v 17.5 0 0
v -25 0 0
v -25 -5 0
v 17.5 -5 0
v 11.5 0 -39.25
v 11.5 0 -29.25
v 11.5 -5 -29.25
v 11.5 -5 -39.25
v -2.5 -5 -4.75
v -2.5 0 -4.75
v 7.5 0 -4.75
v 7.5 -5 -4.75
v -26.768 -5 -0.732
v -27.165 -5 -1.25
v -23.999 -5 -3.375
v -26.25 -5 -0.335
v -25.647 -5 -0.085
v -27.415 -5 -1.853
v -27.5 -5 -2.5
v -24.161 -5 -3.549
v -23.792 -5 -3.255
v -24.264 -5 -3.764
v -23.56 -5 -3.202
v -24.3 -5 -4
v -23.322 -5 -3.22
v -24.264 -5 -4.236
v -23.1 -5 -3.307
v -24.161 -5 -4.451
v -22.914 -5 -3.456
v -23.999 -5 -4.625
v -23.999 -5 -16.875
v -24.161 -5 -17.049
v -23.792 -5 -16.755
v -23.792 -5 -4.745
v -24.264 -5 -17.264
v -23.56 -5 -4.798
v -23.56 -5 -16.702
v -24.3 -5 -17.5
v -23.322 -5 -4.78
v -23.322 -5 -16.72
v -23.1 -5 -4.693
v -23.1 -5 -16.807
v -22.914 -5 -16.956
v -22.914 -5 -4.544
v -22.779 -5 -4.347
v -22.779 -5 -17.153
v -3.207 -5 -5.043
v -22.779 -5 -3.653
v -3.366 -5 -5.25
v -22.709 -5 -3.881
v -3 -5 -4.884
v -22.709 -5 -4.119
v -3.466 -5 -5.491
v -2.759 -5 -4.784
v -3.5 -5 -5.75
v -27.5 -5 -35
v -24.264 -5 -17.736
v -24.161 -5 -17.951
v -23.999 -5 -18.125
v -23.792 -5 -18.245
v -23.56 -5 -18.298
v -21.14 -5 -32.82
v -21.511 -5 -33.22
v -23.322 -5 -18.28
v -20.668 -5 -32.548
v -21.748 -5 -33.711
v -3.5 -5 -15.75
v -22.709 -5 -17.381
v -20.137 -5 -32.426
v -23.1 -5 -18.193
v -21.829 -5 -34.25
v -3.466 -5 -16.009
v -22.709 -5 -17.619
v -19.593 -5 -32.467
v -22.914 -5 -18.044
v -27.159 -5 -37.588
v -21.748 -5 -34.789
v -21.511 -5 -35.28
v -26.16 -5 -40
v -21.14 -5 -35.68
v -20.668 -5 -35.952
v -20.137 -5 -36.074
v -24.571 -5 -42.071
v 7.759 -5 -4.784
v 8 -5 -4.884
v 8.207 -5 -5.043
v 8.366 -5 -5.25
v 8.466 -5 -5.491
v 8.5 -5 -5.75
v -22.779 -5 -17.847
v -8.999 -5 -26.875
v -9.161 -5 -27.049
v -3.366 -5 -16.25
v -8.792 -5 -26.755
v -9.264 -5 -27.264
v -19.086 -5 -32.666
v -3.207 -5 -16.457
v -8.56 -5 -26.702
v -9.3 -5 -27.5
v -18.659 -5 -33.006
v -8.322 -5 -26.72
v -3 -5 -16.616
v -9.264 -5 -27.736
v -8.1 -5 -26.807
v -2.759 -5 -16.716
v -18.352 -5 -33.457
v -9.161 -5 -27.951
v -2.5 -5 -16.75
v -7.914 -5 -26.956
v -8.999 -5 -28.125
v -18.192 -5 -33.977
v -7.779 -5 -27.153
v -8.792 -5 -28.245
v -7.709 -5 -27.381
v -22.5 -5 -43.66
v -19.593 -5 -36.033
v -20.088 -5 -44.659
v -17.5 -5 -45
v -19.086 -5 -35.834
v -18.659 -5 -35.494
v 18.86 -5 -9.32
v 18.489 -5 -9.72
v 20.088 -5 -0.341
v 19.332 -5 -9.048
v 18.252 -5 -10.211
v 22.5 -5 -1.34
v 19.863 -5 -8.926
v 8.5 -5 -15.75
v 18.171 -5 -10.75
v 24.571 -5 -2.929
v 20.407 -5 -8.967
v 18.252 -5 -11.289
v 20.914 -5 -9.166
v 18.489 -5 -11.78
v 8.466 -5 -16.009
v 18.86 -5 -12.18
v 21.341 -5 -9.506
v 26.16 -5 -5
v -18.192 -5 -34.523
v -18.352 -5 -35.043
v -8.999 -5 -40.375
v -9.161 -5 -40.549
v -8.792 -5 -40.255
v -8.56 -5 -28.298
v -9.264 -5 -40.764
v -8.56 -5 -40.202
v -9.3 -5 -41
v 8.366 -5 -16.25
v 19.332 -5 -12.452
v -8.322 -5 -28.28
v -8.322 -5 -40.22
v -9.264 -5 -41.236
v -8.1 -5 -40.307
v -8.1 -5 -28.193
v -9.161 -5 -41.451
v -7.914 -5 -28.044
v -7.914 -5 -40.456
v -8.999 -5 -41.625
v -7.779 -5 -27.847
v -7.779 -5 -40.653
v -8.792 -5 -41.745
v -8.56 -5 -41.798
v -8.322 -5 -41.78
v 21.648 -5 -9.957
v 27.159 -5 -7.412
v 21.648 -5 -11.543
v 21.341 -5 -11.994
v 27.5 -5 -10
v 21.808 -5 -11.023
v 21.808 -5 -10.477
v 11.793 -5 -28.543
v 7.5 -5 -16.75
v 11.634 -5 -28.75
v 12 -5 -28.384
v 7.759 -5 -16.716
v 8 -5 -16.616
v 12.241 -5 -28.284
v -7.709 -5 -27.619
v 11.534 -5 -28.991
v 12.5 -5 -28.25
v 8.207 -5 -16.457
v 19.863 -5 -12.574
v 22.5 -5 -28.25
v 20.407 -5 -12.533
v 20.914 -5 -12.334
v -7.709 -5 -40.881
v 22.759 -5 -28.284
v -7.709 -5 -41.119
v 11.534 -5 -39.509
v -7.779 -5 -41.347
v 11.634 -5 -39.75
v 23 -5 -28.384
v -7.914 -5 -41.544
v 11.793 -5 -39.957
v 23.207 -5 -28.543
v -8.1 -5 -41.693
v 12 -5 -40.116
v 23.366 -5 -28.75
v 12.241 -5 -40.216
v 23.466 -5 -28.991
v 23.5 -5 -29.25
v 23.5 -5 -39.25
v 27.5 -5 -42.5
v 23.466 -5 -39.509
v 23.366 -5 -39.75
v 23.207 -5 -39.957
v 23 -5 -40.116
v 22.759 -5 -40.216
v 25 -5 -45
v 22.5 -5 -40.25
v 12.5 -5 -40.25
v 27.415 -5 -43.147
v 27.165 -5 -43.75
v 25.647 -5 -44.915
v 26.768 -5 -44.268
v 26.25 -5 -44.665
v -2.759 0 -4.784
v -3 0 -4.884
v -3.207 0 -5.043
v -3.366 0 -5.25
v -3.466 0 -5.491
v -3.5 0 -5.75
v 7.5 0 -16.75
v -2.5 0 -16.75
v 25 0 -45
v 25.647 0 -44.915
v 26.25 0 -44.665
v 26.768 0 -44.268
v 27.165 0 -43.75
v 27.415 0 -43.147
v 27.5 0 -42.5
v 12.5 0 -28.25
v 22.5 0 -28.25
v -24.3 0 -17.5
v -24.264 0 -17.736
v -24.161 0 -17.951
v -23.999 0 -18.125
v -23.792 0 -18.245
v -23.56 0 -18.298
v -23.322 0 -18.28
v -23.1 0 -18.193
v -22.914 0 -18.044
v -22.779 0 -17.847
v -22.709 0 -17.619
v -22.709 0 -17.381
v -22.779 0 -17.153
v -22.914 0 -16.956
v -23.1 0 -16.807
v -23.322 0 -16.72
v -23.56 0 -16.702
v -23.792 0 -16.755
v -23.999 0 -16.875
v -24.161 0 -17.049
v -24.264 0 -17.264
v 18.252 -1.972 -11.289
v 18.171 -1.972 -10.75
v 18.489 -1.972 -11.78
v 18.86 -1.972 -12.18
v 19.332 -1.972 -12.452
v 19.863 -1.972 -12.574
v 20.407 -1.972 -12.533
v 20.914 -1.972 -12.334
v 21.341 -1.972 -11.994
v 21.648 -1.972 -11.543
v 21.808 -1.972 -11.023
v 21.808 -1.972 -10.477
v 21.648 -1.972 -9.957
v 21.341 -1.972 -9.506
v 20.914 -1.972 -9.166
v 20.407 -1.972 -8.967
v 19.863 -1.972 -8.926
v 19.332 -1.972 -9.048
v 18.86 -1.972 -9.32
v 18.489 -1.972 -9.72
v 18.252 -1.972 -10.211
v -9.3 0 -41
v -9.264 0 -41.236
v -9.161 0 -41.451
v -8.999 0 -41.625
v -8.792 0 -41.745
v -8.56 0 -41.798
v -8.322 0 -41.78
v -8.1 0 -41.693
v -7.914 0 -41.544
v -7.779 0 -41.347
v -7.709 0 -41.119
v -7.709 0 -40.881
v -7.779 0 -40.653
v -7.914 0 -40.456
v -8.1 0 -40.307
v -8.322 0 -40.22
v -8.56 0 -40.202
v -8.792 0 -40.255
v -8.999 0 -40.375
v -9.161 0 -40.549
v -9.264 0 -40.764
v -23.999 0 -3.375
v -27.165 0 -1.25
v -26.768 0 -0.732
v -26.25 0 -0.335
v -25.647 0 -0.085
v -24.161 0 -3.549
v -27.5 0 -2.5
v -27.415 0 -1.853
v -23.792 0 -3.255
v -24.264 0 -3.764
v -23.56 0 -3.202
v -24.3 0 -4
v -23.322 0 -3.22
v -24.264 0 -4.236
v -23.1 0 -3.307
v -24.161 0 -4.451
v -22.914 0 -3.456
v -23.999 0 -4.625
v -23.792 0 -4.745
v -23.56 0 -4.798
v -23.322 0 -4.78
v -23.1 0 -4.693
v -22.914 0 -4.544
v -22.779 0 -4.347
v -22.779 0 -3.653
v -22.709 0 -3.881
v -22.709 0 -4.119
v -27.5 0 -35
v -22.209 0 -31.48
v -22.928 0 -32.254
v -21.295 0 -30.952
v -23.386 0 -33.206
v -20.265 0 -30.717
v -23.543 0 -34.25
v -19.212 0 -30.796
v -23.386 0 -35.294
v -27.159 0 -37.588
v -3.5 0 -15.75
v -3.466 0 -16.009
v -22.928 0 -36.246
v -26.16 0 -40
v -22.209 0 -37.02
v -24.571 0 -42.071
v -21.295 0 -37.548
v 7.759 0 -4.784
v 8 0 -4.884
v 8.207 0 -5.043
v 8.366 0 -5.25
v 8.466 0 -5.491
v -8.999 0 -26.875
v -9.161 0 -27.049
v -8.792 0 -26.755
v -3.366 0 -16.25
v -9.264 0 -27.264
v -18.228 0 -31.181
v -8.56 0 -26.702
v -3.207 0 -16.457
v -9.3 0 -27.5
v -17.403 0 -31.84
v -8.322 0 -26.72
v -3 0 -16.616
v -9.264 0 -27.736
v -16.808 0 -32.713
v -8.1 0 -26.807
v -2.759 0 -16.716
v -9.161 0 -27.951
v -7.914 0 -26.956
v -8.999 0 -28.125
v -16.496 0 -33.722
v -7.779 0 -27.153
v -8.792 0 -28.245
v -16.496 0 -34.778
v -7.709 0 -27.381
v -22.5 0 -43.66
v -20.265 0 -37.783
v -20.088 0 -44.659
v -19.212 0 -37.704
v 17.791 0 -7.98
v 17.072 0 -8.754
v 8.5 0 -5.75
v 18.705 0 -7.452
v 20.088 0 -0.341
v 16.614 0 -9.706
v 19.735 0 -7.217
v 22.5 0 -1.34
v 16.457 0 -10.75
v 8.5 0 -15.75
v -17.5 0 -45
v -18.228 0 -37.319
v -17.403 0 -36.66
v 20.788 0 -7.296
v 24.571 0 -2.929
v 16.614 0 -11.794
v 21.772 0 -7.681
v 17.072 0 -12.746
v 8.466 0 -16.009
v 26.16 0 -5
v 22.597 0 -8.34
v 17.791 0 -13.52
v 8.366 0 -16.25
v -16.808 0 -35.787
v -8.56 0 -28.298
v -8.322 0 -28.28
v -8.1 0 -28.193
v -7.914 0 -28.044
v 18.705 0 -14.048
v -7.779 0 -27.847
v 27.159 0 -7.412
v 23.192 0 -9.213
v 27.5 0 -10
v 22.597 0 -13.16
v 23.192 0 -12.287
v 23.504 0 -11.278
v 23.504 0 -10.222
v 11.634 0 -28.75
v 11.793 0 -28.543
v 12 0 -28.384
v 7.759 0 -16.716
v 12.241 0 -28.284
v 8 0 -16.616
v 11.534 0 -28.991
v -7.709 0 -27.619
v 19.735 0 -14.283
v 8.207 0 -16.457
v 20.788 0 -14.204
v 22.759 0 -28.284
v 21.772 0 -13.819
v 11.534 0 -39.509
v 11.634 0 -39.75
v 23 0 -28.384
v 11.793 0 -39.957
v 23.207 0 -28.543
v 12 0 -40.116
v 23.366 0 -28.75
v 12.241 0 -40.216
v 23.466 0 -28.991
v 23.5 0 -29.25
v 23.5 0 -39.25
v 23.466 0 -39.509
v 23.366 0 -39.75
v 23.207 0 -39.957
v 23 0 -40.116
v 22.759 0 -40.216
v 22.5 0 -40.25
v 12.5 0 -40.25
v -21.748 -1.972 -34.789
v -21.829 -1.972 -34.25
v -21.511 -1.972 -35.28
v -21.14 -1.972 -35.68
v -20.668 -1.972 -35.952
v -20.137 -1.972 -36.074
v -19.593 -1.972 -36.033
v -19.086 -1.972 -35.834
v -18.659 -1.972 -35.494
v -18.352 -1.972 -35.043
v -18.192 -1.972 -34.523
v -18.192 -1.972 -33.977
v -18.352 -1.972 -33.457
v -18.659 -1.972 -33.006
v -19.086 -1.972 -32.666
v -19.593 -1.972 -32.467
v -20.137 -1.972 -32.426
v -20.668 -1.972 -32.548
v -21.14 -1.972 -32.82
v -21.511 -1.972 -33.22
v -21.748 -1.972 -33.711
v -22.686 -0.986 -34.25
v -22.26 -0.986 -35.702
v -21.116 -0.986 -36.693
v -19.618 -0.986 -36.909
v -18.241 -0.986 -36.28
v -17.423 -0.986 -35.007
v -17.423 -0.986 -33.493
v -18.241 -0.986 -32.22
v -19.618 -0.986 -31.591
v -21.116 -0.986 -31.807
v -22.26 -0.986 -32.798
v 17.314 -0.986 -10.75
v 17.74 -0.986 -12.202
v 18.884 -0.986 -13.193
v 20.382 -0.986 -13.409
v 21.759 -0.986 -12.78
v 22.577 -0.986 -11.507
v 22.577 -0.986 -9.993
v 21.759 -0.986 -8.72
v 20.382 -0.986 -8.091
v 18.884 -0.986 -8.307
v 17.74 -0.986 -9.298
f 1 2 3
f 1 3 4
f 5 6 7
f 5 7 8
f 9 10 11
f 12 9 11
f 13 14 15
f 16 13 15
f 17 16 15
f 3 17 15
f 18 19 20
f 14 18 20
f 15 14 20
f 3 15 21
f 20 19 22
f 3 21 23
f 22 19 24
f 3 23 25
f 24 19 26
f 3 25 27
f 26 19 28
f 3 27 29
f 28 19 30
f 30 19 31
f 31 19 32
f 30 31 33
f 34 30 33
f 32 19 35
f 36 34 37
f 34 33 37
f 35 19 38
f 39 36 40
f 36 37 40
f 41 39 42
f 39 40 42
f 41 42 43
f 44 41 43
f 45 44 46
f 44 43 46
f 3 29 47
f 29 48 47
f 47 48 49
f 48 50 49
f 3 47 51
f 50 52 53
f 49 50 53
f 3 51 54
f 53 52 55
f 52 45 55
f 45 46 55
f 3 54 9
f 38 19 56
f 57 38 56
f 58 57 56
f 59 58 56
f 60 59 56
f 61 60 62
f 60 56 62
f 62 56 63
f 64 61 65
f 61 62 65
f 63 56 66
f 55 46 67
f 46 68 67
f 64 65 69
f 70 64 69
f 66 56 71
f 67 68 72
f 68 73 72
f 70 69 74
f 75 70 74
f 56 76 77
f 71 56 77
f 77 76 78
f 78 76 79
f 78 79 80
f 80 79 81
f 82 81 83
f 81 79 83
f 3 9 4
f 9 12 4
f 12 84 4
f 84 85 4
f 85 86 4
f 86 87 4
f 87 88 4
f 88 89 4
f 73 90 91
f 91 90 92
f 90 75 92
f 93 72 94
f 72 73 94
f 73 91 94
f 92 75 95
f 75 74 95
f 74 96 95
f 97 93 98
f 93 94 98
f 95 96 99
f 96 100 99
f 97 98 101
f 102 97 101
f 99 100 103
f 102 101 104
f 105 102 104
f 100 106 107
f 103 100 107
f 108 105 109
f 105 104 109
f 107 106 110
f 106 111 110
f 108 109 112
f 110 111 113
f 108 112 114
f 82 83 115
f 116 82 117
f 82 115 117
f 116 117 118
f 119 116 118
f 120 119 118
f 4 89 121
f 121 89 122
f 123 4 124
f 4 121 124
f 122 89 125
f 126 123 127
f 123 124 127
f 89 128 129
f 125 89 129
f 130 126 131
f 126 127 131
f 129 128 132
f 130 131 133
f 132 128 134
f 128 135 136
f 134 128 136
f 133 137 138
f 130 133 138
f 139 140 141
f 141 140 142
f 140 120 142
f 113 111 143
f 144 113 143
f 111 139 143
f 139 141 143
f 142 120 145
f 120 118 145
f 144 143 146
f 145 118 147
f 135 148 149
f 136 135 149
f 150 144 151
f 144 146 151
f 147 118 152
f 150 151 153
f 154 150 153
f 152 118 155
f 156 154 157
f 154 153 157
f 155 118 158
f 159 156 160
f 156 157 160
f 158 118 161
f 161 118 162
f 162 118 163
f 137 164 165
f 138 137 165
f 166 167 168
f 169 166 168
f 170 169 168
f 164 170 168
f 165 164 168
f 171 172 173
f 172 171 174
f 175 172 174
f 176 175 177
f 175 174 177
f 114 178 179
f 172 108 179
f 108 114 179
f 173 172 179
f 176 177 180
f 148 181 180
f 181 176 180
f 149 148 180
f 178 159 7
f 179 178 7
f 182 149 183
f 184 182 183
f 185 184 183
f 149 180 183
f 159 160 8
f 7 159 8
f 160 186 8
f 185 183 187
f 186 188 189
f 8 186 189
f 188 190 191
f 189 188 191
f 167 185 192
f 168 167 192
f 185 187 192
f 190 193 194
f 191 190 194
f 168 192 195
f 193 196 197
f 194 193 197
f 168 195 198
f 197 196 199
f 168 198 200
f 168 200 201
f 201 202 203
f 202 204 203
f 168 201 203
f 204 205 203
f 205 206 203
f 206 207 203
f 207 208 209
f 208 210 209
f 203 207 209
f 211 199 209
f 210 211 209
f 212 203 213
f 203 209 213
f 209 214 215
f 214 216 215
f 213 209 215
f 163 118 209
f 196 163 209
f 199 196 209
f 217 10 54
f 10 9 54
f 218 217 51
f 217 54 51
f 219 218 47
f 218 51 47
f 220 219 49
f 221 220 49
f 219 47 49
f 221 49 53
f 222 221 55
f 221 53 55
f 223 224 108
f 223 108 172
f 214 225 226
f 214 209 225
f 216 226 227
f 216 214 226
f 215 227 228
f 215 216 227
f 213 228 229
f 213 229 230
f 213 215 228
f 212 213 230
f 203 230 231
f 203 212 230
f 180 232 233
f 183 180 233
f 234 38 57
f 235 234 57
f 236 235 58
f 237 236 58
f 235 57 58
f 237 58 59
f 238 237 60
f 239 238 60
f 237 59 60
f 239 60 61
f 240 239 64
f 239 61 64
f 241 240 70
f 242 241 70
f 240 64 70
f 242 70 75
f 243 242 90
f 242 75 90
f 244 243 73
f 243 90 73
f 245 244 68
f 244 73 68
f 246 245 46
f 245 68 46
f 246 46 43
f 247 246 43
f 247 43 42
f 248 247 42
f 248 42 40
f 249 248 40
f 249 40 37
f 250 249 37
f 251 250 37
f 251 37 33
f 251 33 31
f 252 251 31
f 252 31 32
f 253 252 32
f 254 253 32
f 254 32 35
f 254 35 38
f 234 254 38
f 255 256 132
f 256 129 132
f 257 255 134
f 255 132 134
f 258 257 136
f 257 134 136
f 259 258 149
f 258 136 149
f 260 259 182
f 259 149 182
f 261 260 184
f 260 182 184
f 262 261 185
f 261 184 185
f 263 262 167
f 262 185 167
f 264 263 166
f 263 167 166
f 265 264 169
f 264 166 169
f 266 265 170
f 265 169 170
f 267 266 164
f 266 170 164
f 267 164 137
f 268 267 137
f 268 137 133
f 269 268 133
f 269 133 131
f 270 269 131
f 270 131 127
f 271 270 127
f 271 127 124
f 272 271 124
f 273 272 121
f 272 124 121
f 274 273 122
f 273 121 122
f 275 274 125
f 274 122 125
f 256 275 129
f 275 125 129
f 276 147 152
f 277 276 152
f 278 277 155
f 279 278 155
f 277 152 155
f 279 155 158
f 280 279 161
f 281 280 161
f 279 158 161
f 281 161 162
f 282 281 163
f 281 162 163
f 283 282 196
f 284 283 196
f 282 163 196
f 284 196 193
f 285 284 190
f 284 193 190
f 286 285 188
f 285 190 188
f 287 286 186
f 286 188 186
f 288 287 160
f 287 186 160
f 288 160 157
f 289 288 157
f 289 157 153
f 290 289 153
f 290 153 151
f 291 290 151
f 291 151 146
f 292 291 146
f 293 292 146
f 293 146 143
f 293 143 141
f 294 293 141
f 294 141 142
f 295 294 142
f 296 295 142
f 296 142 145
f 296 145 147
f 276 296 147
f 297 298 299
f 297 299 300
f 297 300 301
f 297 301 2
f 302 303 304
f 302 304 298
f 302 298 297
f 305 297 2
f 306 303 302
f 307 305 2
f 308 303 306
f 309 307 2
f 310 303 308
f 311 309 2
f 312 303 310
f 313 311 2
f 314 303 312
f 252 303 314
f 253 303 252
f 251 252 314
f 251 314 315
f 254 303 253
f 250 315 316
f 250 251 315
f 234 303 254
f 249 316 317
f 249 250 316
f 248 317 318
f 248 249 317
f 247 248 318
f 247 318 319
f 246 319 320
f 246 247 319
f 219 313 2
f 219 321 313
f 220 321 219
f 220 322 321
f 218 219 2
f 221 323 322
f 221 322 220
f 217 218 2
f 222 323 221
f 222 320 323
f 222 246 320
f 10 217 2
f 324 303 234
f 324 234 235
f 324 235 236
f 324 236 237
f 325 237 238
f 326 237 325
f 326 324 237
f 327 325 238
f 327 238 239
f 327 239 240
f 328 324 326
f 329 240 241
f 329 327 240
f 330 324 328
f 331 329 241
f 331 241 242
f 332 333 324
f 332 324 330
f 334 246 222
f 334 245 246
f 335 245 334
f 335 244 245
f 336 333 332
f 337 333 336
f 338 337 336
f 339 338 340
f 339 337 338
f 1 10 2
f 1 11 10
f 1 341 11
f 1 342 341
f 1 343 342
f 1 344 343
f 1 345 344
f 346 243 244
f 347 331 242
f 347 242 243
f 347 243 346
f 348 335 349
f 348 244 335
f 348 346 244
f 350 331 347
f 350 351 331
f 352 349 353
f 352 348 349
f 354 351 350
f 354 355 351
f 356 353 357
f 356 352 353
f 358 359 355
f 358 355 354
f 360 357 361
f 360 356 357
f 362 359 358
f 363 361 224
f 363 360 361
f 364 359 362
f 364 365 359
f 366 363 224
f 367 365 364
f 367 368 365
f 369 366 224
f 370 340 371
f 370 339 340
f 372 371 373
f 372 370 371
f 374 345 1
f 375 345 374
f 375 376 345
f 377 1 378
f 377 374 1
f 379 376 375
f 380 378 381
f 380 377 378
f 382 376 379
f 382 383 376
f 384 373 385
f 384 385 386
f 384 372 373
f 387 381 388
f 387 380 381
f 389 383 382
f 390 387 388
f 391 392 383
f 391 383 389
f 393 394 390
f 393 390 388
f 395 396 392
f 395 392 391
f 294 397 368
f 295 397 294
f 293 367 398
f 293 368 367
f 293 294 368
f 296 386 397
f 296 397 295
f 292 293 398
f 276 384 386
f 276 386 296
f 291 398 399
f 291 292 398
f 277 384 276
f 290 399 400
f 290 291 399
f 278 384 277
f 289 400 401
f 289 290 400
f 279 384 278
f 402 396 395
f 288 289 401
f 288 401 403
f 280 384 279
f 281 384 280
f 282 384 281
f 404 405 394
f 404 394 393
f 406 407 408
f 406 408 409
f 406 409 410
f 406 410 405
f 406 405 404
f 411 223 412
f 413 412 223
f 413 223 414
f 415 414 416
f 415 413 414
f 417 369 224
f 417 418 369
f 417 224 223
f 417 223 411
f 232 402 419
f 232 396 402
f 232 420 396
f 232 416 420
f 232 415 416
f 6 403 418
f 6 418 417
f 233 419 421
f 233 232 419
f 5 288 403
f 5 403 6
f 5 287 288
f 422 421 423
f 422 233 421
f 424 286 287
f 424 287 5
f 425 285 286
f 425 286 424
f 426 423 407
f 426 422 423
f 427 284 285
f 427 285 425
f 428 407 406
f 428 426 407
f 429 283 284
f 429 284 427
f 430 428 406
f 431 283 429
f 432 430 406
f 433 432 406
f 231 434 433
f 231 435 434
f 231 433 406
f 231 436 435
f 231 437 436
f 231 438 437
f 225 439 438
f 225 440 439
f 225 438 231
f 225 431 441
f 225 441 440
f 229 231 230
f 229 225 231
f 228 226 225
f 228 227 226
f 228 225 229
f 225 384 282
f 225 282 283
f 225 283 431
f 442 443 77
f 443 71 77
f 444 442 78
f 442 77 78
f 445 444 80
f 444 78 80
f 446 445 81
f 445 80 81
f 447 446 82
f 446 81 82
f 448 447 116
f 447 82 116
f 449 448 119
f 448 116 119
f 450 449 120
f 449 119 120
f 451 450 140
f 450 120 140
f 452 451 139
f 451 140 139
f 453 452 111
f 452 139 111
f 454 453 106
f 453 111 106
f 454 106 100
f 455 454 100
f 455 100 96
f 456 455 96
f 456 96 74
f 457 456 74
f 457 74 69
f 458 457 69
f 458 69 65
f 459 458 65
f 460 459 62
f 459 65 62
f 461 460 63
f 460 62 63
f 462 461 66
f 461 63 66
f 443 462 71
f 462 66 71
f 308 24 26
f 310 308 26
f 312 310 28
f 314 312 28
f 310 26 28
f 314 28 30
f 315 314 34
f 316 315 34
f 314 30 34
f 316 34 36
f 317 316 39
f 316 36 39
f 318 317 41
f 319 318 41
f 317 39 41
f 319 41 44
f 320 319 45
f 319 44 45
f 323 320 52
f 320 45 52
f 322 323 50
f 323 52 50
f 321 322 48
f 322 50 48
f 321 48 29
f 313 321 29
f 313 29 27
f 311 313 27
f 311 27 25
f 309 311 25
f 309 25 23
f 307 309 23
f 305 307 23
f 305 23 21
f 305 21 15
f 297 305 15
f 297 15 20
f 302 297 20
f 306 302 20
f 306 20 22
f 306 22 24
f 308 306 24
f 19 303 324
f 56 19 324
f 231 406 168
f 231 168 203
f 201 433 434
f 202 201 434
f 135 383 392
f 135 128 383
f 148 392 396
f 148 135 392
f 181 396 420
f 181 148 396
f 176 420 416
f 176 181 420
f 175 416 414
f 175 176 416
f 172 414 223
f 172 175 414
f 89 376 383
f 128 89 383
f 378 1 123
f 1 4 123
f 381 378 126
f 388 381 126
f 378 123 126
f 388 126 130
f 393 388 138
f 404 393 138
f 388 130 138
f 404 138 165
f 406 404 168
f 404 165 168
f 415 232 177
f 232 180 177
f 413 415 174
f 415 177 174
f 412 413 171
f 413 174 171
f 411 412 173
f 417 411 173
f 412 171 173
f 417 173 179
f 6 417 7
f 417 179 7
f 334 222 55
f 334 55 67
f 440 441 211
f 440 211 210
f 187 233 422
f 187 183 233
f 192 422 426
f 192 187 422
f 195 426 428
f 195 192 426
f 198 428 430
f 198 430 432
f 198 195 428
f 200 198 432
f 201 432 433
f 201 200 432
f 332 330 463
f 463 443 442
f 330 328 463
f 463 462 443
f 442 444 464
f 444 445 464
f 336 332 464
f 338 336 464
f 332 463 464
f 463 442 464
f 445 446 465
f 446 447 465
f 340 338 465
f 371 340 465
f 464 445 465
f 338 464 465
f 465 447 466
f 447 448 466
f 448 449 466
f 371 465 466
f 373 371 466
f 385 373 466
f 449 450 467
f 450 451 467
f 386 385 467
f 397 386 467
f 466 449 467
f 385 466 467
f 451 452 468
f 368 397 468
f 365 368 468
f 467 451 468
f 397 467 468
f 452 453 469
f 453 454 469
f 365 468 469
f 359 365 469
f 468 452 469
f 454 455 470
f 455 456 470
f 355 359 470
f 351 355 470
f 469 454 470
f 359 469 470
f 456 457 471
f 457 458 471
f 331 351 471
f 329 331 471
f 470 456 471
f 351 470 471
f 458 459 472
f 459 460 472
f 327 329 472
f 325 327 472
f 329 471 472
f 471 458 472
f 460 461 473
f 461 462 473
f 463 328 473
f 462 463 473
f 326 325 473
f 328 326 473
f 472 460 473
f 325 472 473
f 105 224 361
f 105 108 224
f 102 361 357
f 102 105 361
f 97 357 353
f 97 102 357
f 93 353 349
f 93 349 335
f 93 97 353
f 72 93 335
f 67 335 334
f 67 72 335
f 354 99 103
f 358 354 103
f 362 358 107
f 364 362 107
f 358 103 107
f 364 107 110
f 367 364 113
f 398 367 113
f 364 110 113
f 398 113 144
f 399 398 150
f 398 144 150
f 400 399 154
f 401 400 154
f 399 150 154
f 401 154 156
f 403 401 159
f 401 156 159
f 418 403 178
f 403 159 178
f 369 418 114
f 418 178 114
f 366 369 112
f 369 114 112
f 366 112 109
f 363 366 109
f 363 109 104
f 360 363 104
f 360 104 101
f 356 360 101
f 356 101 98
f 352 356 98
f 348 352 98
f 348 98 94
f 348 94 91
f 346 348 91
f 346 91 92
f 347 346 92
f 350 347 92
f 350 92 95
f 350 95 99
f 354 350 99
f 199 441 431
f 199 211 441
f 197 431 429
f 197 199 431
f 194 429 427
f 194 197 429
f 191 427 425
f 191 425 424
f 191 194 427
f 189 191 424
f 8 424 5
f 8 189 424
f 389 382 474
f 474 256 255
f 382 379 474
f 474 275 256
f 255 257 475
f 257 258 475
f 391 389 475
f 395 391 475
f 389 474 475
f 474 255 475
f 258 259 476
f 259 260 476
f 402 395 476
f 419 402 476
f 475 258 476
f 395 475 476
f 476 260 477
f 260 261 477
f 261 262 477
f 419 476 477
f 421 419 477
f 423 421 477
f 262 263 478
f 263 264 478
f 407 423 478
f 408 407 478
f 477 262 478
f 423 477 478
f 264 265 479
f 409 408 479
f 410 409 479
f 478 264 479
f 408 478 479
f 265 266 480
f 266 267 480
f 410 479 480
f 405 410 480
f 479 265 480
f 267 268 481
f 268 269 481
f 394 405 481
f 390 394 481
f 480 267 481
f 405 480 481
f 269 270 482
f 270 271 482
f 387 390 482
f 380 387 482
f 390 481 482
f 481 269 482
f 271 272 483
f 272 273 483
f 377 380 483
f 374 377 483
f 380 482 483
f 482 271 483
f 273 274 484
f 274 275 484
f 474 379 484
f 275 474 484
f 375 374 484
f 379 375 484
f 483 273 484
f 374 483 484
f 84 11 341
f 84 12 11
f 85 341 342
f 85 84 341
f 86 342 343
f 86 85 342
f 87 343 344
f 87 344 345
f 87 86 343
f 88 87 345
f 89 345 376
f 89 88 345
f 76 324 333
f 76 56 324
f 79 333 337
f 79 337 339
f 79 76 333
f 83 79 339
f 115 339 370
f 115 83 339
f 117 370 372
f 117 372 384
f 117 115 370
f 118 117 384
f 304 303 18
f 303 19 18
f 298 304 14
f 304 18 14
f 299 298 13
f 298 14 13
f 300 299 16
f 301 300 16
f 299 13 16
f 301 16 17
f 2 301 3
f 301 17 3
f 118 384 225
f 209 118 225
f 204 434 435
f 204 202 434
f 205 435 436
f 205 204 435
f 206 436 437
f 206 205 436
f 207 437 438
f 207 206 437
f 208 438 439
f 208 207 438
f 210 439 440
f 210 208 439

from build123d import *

# Parameters (mm, degrees)
BASE_SKETCH_W               = 55
BASE_SKETCH_H               = 45
BASE_EXTRUDE_DEPTH          = 5
MOSFET_MOUNTING_HOLES_D     = 1.6
MOUNTING_HOLES_D            = 3.6576
MOUNTING_HOLES_CSINK_D      = 7.0866
MOUNTING_HOLES_CSINK_ANGLE  = 82
PIN_RELIEF_SKETCH_W         = 12
PIN_RELIEF_SKETCH_H         = 12
CUT_TERMAL_PIN_RELIEF_DEPTH = 53.974050251
FILLET1_R                   = 10
FILLET2_R                   = 2.5
FILLET3_R                   = 1


with BuildPart() as part:
    # Base Sketch → Base Extrude (new body)
    with BuildSketch(Plane(origin=(0, 0, 0), x_dir=(1, 0, 0), z_dir=(0, 1, 0))):
        with Locations((0, 22.5)):
            Rectangle(BASE_SKETCH_W, BASE_SKETCH_H)
    extrude(amount=-BASE_EXTRUDE_DEPTH)

    # Mosfet Mounting Holes (through all)
    with Locations(Plane(origin=(0, 0, 0), x_dir=(1, 0, 0), z_dir=(0, 1, 0))):
        with Locations((-23.5, 4), (-23.5, 17.5), (-8.5, 27.5), (-8.5, 41)):
            Hole(MOSFET_MOUNTING_HOLES_D / 2)

    # Mounting Holes (through all)
    with Locations(Plane(origin=(0, 0, 0), x_dir=(1, 0, 0), z_dir=(0, 1, 0))):
        with Locations((-20, 34.25), (20, 10.75)):
            CounterSinkHole(MOUNTING_HOLES_D / 2, MOUNTING_HOLES_CSINK_D / 2, counter_sink_angle=MOUNTING_HOLES_CSINK_ANGLE)

    # Pin Relief Sketch → Cut Termal Pin Relief (cut, through all)
    with BuildSketch(Plane(origin=(0, 0, 0), x_dir=(1, 0, 0), z_dir=(0, 1, 0))):
        with Locations((2.5, 10.75)):
            Rectangle(PIN_RELIEF_SKETCH_W, PIN_RELIEF_SKETCH_H)
        with Locations((17.5, 34.25)):
            Rectangle(PIN_RELIEF_SKETCH_W, PIN_RELIEF_SKETCH_H)
    extrude(amount=-CUT_TERMAL_PIN_RELIEF_DEPTH, mode=Mode.SUBTRACT)

    # Fillet1
    fillet1_edges = [part.edges().sort_by_distance(p)[0] for p in [
        (-27.5, -2.5, -45),
        (27.5, -2.5, 0),
    ]]
    fillet(fillet1_edges, radius=FILLET1_R)

    # Fillet2
    fillet2_edges = [part.edges().sort_by_distance(p)[0] for p in [
        (27.5, -2.5, -45),
        (-27.5, -2.5, 0),
    ]]
    fillet(fillet2_edges, radius=FILLET2_R)

    # Fillet3
    fillet3_edges = [part.edges().sort_by_distance(p)[0] for p in [
        (-3.5, -2.5, -4.75),
        (-3.5, -2.5, -16.75),
        (8.5, -2.5, -16.75),
        (8.5, -2.5, -4.75),
        (11.5, -2.5, -28.25),
        (11.5, -2.5, -40.25),
        (23.5, -2.5, -40.25),
        (23.5, -2.5, -28.25),
    ]]
    fillet(fillet3_edges, radius=FILLET3_R)


solid = part.part
